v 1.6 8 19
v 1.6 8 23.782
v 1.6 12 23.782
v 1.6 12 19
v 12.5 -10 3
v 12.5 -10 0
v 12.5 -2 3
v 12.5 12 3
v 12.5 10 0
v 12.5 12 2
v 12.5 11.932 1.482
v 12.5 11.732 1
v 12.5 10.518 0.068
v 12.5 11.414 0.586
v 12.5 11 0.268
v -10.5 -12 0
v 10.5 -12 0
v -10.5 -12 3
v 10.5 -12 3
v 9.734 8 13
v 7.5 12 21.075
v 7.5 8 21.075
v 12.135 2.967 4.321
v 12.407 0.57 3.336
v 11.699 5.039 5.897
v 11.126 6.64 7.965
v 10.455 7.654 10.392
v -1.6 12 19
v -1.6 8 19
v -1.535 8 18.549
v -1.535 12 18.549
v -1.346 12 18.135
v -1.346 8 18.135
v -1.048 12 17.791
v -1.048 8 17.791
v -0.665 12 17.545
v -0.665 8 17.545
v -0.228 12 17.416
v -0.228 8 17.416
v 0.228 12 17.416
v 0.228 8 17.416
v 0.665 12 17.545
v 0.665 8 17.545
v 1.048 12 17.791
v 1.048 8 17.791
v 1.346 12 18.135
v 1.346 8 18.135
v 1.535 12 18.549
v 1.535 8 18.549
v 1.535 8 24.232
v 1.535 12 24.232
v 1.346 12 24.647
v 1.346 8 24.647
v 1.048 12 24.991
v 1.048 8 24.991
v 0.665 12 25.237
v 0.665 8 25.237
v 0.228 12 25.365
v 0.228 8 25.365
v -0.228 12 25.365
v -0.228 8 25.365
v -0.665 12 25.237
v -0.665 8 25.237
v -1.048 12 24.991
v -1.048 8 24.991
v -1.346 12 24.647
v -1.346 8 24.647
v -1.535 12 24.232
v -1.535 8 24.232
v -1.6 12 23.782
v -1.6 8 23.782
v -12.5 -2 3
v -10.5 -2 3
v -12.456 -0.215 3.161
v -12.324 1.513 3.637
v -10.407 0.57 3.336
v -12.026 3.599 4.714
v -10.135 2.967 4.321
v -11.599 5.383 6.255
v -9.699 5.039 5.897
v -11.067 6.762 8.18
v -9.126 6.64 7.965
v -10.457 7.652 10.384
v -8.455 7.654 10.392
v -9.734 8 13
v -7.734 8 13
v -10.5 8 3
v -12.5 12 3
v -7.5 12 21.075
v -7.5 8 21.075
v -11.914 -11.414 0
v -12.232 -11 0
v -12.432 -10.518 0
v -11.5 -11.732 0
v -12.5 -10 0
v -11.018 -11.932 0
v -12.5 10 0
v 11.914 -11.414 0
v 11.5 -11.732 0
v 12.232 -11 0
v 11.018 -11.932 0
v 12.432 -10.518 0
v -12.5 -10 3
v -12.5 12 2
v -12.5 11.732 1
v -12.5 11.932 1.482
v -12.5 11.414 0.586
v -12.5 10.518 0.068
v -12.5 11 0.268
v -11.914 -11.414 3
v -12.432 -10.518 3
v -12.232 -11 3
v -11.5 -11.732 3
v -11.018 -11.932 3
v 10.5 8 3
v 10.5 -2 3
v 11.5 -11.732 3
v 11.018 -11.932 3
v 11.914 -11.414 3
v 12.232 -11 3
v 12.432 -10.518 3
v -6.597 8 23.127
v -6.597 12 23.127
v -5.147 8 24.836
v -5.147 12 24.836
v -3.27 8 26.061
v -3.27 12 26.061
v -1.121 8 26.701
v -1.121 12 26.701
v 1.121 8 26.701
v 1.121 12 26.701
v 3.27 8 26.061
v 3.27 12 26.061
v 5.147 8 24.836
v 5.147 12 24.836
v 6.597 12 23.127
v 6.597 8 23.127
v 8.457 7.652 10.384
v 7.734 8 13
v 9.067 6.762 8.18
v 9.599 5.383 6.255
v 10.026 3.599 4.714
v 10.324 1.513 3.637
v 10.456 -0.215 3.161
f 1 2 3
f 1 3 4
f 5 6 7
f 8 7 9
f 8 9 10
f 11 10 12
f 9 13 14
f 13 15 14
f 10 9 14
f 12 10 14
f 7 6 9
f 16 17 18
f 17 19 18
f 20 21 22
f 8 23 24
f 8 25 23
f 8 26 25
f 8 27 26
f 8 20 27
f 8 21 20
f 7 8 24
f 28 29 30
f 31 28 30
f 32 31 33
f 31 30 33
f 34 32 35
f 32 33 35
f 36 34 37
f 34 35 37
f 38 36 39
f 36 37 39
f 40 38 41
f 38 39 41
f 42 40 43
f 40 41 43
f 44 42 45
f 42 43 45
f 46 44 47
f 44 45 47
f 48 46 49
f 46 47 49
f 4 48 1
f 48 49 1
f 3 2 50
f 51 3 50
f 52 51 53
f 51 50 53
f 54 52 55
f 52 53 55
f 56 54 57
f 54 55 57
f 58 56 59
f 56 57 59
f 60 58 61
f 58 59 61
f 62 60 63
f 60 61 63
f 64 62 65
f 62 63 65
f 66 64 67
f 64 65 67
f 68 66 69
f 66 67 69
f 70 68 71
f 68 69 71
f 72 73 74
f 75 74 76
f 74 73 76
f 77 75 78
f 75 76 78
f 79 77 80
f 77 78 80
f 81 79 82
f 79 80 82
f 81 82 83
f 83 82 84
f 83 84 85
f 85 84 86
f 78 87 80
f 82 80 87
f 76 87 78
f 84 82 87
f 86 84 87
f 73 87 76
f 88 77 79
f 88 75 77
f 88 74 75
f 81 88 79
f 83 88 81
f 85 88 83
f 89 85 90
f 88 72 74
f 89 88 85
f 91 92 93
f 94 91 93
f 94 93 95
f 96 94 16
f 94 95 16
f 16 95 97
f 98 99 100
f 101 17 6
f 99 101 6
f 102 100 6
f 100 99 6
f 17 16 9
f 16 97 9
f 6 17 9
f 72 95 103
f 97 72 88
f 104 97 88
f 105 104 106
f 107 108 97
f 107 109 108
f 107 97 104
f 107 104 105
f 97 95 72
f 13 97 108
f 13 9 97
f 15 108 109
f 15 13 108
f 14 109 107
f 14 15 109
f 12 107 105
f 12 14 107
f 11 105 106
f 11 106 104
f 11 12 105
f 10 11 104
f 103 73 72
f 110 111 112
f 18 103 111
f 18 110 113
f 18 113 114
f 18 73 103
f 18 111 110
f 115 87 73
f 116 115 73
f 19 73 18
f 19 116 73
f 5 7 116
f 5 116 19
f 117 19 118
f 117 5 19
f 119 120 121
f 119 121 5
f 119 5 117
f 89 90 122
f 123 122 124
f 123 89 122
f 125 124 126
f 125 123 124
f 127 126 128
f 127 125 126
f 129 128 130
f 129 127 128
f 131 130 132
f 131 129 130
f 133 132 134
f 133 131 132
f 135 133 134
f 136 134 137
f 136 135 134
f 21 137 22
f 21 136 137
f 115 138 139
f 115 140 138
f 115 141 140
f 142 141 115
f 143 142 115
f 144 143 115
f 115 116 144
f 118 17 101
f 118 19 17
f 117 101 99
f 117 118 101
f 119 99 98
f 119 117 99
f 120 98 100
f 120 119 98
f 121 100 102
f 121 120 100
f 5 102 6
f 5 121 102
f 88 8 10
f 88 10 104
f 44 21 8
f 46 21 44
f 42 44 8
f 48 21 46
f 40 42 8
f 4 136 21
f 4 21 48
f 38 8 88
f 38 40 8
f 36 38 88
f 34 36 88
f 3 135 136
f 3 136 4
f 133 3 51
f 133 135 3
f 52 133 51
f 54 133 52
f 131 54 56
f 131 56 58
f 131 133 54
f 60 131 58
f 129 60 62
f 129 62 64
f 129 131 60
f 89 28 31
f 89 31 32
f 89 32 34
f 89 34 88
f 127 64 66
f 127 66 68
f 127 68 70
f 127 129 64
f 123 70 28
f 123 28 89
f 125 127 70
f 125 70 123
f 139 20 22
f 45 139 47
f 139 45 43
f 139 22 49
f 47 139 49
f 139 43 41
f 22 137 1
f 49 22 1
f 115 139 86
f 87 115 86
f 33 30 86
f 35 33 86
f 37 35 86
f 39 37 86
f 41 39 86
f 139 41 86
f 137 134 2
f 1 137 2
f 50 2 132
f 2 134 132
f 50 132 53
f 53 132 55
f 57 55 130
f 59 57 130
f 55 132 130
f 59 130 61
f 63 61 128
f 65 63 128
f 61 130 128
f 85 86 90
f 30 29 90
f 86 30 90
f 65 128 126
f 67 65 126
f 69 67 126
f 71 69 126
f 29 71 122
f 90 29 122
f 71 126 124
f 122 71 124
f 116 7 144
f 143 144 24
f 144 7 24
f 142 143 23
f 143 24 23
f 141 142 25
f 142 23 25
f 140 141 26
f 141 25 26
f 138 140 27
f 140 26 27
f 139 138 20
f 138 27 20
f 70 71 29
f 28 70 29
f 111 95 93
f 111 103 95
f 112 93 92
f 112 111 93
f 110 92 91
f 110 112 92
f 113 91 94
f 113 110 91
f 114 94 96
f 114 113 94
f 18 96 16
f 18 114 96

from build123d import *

# Parameters (mm, degrees)
SKETCH_W        = 25
SKETCH_H        = 24
PAD_DEPTH       = 3
PAD001_DEPTH    = 24
POCKET_DEPTH    = 20
POCKET001_DEPTH = 27
POCKET002_DEPTH = 4
FILLET_R        = 2
FILLET001_R     = 2


with BuildPart() as part:
    # Sketch → Pad (new body)
    with BuildSketch(Plane.XY):
        Rectangle(SKETCH_W, SKETCH_H)
    extrude(amount=PAD_DEPTH)

    # Sketch001 → Pad001 (new body)
    with BuildSketch(Plane(origin=(0, 12, 0), x_dir=(-1, 0, 0), z_dir=(0, 1, 0))):
        with BuildLine():
            Line((12.5, 3), (7.5, 21.074721))
            ThreePointArc((7.5, 21.074721), (0, 26.781675), (-7.5, 21.074721))
            Line((-7.5, 21.074721), (-12.5, 3))
            Line((12.5, 3), (-12.5, 3))
        make_face()
    extrude(amount=-PAD001_DEPTH)

    # Sketch002 → Pocket (cut)
    with BuildSketch(Plane.XZ.offset(12)):
        Polygon((10.5, 3), (-10.5, 3), (-7.733706, 13), (-15, 13), (-15, 26.781675), (15, 26.781675), (15, 13), (7.733706, 13), align=None)
    extrude(amount=-POCKET_DEPTH, mode=Mode.SUBTRACT)

    # Sketch003 → Pocket001 (cut)
    with BuildSketch(Plane.YZ.offset(12.5)):
        with BuildLine():
            ThreePointArc((-1.99997, 3), (8, 13), (-1.99997, 23))
            Line((-12, 23), (-1.99997, 23))
            Line((-12, 3), (-12, 23))
            Line((-1.99997, 3), (-12, 3))
        make_face()
    extrude(amount=-POCKET001_DEPTH, mode=Mode.SUBTRACT)

    # Sketch004 → Pocket002 (cut)
    with BuildSketch(Plane.XZ.offset(-8)):
        with BuildLine():
            ThreePointArc((1.6, 23.781675), (0, 25.381675), (-1.6, 23.781675))
            Line((-1.6, 23.781675), (-1.6, 19))
            ThreePointArc((-1.6, 19), (0, 17.4), (1.6, 19))
            Line((1.6, 23.781675), (1.6, 19))
        make_face()
    extrude(amount=-POCKET002_DEPTH, mode=Mode.SUBTRACT)

    # Fillet
    fillet_edges = [part.edges().sort_by_distance(p)[0] for p in [
        (12.5, -12, 1.5),
        (-12.5, -12, 1.5),
    ]]
    fillet(fillet_edges, radius=FILLET_R)

    # Fillet001
    fillet001_edges = [part.edges().sort_by_distance(p)[0] for p in [
        (0, 12, 0),
    ]]
    fillet(fillet001_edges, radius=FILLET001_R)


solid = part.part
